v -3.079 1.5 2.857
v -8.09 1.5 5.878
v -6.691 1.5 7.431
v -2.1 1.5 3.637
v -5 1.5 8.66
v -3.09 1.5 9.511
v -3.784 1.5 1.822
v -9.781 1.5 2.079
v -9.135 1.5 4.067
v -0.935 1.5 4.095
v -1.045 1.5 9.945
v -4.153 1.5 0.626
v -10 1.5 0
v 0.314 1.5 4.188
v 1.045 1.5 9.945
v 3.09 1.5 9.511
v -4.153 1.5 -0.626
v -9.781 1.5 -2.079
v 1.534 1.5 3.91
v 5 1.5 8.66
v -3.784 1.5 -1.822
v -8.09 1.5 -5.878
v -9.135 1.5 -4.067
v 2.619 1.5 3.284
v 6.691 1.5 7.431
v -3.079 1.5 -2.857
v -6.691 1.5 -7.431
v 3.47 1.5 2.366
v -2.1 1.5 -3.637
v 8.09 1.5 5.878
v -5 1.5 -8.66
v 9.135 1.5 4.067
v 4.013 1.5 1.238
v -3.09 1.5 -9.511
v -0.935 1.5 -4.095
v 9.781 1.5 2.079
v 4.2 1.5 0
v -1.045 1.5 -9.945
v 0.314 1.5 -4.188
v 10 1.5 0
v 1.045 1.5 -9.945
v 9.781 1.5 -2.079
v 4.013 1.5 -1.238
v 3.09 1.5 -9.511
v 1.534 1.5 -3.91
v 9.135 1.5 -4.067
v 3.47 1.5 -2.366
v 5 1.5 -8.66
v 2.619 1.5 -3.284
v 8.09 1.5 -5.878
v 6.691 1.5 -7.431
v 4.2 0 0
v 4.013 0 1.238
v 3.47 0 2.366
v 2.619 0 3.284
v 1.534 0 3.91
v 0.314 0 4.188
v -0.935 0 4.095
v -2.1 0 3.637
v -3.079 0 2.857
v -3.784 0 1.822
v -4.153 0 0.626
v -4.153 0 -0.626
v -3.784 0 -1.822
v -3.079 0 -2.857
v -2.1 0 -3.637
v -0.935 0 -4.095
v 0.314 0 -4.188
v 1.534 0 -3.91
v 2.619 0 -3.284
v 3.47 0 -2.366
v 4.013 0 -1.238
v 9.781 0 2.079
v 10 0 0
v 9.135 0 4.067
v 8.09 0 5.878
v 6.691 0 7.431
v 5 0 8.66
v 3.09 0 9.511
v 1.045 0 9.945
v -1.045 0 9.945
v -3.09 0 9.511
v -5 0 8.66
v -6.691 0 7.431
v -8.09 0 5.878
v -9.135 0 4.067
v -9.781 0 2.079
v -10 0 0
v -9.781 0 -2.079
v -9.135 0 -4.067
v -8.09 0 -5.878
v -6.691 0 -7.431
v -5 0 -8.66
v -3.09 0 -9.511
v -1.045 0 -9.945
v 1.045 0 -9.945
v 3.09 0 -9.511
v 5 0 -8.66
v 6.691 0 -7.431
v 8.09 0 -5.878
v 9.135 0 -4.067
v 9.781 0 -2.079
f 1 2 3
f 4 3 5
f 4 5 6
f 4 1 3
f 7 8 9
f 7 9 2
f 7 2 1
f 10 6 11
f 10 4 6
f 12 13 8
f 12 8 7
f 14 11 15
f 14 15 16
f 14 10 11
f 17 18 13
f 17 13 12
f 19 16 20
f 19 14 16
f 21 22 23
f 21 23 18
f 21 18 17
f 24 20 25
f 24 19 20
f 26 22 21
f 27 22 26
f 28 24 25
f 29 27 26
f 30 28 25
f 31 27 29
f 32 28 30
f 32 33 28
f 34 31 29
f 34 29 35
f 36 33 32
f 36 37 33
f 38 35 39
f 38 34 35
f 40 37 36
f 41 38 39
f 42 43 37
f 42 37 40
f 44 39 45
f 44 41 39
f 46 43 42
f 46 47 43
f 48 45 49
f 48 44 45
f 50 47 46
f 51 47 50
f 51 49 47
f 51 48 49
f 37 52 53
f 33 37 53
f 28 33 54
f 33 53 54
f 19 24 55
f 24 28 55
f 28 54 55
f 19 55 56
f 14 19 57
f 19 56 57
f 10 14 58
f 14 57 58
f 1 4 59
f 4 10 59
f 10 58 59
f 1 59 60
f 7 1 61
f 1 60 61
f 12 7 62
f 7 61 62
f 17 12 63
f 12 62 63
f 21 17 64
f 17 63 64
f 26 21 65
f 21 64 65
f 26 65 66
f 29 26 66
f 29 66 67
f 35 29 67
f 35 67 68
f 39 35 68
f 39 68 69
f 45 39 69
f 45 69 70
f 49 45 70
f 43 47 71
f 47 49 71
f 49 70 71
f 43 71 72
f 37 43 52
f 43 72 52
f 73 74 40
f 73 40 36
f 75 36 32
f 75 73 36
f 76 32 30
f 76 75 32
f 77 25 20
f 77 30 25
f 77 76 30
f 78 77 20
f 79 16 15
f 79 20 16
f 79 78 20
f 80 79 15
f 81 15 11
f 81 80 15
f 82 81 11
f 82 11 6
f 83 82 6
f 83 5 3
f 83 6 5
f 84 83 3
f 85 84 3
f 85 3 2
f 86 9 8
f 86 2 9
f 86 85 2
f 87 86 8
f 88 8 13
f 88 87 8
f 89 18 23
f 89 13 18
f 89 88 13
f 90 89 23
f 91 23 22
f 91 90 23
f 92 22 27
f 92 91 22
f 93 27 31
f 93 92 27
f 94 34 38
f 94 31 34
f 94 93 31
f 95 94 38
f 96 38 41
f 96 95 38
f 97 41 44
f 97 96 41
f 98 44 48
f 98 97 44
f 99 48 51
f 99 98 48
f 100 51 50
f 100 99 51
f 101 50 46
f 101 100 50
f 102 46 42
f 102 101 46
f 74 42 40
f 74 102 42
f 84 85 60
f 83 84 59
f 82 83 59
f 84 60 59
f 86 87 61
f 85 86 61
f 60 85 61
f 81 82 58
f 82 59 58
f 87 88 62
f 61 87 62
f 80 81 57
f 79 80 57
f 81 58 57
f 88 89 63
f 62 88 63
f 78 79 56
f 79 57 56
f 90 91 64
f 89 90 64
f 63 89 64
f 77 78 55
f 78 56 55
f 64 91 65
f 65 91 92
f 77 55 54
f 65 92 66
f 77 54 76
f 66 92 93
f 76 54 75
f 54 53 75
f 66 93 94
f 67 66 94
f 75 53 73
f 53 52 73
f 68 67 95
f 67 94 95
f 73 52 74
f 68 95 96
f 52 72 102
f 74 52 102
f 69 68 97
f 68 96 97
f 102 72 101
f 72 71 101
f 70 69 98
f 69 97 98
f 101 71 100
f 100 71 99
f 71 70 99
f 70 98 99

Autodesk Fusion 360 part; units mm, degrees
sketch "Sketch1" plane through (0, 0, 0) normal (0, 1, 0) x (1, 0, 0)
  circle A0 centre (0, 0) radius 4.2
  circle A1 centre (0, 0) radius 10
  dimension "d1" = 8.4
  dimension "d2" = 20
extrude "Extrude1" add sketch "Sketch1" along normal blind 1.5 makes body 1
copy_body "Body->Comp1" bodies 1 removing the originals makes body 2 in component "M8x20 washer"
component "M8x20 washer" placed x (1, 0, 0) y (0, 1, 0) z (0, 0, 1) at (0, 0, 0)
